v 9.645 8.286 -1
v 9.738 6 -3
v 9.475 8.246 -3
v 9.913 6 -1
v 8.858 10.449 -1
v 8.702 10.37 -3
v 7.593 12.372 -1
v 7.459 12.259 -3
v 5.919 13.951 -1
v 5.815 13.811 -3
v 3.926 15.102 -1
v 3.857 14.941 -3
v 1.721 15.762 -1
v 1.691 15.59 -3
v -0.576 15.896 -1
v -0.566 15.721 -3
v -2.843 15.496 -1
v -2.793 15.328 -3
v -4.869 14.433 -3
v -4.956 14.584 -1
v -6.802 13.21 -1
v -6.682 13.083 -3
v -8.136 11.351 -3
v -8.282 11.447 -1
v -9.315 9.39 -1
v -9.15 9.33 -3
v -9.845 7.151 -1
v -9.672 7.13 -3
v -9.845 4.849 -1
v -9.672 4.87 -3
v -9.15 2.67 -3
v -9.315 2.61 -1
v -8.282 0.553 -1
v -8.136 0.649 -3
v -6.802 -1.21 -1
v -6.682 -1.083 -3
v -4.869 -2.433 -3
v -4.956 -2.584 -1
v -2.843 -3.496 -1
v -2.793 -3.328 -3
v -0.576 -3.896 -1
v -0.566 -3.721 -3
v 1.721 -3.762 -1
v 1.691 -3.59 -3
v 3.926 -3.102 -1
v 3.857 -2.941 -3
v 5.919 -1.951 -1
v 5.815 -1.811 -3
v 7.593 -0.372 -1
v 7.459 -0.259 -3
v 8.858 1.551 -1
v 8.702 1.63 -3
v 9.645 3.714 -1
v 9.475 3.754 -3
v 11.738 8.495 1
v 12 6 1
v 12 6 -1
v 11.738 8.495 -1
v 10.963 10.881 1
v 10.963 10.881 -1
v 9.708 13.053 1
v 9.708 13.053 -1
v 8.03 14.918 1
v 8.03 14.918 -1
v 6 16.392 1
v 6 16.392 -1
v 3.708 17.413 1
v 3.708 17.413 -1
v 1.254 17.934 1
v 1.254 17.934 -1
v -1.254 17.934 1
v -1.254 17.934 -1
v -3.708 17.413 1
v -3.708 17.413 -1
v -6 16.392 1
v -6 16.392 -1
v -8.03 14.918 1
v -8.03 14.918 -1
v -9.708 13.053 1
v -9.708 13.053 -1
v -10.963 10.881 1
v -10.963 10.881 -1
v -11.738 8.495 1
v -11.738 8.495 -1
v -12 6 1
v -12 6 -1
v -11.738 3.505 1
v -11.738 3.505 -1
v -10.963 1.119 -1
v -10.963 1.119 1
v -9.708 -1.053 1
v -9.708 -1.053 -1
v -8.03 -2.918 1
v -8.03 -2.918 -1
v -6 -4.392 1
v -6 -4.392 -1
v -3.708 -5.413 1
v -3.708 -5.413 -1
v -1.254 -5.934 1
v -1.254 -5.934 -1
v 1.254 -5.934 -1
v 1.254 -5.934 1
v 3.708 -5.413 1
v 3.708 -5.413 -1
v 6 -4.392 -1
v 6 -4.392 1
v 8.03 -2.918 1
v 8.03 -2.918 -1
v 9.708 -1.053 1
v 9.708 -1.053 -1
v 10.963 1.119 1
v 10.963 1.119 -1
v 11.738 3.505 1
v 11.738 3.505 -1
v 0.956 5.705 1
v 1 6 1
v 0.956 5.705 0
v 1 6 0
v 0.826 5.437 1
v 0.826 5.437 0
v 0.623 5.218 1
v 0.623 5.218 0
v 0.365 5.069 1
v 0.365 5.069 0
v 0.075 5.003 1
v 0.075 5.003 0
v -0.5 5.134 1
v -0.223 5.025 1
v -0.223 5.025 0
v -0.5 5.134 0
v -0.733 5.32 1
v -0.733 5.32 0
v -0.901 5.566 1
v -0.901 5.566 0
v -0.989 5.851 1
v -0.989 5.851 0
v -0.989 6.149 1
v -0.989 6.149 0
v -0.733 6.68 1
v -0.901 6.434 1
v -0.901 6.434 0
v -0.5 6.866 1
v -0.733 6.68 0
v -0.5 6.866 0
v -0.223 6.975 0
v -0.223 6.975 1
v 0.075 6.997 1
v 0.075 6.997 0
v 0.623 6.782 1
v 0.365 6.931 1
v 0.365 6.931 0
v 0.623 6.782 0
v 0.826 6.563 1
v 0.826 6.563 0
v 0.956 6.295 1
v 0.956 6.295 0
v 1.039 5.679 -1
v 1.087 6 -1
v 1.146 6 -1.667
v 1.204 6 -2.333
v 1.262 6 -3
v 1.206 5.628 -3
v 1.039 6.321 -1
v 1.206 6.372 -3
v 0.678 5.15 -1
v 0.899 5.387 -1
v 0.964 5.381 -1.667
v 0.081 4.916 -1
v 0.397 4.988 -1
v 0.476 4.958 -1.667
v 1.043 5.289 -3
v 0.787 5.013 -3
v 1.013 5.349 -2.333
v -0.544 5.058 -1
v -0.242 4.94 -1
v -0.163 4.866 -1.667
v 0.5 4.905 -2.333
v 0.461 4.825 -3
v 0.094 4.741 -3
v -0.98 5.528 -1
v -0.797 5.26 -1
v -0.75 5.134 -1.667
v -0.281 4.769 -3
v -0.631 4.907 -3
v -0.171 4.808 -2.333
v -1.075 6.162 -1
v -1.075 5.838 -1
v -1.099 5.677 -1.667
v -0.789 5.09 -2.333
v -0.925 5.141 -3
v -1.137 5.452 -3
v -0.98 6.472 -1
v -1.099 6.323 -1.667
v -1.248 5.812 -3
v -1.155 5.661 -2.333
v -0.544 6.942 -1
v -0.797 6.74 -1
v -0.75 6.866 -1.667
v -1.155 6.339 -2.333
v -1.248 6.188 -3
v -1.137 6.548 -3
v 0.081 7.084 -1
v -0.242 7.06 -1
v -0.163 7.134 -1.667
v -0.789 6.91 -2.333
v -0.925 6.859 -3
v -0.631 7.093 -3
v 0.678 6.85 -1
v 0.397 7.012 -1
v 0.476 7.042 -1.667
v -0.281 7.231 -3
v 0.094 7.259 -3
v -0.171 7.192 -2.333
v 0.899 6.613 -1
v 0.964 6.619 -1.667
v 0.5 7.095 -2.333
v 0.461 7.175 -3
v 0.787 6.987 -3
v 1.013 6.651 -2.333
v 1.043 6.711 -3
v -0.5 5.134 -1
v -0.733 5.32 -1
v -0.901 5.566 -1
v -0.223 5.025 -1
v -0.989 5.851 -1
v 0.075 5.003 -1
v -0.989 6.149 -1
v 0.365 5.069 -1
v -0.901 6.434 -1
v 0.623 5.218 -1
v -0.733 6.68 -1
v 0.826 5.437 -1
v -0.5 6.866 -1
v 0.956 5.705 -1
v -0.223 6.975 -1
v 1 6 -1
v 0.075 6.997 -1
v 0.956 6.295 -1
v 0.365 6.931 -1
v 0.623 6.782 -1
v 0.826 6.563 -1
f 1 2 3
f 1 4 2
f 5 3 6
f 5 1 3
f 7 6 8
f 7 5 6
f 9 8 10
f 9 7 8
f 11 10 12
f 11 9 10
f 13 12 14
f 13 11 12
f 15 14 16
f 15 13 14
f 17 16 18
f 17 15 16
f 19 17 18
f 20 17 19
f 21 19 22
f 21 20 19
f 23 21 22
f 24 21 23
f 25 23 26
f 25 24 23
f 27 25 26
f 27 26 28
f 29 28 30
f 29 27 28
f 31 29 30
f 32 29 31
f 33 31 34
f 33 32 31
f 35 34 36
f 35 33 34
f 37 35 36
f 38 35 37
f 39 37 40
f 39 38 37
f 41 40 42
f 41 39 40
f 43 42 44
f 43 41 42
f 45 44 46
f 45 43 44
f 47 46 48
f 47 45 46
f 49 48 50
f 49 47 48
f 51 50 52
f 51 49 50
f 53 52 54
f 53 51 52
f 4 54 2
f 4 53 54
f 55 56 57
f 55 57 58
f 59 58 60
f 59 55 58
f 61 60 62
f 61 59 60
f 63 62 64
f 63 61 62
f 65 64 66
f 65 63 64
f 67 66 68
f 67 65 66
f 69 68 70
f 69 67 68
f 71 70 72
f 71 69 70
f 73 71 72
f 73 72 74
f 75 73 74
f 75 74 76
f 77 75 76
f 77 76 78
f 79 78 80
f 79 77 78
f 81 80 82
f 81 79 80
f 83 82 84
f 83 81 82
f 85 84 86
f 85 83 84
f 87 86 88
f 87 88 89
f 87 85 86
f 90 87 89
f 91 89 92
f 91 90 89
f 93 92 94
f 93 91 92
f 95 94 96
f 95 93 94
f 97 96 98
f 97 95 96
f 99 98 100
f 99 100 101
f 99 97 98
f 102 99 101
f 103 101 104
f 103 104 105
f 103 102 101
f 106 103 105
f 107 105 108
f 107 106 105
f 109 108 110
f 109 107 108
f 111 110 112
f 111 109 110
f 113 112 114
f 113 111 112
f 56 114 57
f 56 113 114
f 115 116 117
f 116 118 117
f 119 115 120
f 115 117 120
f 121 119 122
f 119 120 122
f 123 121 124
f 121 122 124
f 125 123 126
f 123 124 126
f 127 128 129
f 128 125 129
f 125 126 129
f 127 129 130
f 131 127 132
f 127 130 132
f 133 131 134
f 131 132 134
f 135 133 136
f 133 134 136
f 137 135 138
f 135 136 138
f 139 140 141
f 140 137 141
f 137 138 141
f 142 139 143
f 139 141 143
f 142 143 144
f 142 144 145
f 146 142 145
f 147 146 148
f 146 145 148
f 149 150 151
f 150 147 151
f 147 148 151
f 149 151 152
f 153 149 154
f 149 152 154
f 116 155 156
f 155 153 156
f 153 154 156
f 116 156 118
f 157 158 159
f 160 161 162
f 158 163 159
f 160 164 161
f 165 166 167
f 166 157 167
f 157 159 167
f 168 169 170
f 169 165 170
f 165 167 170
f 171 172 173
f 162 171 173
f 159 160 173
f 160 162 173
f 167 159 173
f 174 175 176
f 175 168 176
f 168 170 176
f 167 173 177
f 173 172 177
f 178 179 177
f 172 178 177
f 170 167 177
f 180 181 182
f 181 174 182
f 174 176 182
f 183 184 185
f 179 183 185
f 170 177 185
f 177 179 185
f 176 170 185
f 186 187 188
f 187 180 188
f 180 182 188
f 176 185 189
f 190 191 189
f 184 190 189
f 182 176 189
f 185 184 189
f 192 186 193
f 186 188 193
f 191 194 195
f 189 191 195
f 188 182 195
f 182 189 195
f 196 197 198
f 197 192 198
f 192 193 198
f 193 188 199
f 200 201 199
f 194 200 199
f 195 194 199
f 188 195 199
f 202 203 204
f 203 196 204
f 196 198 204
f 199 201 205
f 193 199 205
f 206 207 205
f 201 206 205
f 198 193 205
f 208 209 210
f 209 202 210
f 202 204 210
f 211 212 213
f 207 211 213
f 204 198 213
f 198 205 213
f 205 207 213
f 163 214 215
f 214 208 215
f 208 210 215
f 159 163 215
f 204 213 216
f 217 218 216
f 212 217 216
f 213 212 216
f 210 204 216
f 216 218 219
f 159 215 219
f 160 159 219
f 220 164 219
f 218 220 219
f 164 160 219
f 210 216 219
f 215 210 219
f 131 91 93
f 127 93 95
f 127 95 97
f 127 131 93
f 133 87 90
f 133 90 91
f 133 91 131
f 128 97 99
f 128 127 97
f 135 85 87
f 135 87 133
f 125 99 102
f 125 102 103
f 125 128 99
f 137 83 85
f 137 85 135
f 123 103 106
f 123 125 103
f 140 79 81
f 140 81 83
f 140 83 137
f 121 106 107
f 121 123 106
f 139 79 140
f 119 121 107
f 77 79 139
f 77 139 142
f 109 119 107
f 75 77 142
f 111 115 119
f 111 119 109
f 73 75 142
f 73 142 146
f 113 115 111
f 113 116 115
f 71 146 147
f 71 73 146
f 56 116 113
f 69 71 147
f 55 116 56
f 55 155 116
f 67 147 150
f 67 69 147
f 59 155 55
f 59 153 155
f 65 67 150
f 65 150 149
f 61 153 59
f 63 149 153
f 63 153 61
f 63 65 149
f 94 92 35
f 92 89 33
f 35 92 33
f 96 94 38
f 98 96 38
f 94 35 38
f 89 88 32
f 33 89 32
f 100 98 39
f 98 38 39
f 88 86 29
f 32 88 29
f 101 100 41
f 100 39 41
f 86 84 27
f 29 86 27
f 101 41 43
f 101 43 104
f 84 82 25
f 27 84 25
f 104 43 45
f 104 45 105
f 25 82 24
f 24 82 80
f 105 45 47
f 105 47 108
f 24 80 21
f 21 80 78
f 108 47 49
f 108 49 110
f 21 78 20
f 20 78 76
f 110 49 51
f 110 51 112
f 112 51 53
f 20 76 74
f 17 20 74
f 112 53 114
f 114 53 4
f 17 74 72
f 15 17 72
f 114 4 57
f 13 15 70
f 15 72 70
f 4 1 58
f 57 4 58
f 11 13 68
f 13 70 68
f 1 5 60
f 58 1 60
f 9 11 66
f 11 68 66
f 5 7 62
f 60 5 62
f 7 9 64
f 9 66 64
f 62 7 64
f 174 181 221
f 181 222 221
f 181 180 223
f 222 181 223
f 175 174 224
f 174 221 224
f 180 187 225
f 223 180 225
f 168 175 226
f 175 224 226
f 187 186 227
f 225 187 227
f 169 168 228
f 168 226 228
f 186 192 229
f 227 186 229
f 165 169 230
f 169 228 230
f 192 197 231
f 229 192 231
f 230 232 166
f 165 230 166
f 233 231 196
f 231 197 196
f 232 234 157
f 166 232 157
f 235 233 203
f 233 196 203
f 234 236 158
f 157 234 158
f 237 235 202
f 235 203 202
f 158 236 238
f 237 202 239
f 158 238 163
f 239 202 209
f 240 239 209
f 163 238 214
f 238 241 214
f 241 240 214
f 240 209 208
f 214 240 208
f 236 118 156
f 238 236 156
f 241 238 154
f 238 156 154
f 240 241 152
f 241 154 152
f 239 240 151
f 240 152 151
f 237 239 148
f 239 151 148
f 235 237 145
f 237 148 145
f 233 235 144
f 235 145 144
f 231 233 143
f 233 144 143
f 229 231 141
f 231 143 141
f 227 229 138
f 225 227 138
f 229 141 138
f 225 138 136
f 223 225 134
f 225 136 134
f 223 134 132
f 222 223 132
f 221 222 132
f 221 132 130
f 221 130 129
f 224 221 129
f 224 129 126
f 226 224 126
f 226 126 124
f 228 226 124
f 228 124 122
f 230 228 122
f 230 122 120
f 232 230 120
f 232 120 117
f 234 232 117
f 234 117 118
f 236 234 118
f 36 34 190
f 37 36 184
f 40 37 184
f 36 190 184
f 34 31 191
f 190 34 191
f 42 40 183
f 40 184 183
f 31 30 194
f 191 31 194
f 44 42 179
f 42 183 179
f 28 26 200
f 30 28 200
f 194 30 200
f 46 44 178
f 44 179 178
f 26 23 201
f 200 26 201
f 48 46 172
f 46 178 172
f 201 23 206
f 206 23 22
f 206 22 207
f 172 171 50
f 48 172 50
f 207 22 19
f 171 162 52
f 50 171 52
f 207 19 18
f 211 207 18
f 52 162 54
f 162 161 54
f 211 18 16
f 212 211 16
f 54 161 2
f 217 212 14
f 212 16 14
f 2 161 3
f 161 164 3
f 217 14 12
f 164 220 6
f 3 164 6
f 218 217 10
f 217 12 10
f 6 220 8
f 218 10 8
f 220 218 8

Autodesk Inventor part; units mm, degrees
ref_plane "YZ Plane" through (0, 0, 0) normal (1, 0, 0) x (0, 1, 0)
ref_plane "XZ Plane" through (0, 0, 0) normal (0, 1, 0) x (-1, 0, 0)
ref_plane "XY Plane" through (0, 0, 0) normal (0, 0, 1) x (1, 0, 0)
ref_plane "Arbeitsebene1" through (0, 0, 0) normal (0, 0, 1) x (1, 0, 0)
sketch "Skizze1" plane through (0, 0, 0) normal (0, 0, 1) x (1, 0, 0)
  line L0 (-6, -30.9) -> (-6, -18.4)
  line L1 (-6, -30.9) -> (-19.3, -30.9)
  line L2 (-19.3, -30.9) -> (-19.3, -33.9)
  line L3 (10.7, -33.9) -> (-19.3, -33.9)
  line L4 (10.7, -30.9) -> (10.7, -33.9)
  line L5 (10.7, -30.9) -> (6, -30.9)
  line L6 (6, -18.4) -> (6, -30.9)
  line L7 (16.5, -18.4) -> (6, -18.4)
  line L8 (16.5, -15.118081) -> (16.5, -18.4)
  line L9 (21.118081, -10.5) -> (16.5, -15.118081)
  line L10 (24.4, -10.5) -> (21.118081, -10.5)
  line L11 (24.4, 22.5) -> (24.4, -10.5)
  line L12 (21.118081, 22.5) -> (24.4, 22.5)
  line L13 (16.5, 27.118081) -> (21.118081, 22.5)
  line L14 (16.5, 30.4) -> (16.5, 27.118081)
  line L15 (-16.5, 30.4) -> (-2.249898, 30.4)
  line L16 (-16.5, 27.118081) -> (-16.5, 30.4)
  line L17 (-21.118081, 22.5) -> (-16.5, 27.118081)
  line L18 (-24.4, 22.5) -> (-21.118081, 22.5)
  line L19 (-24.4, -10.5) -> (-24.4, 22.5)
  line L20 (-21.118081, -10.5) -> (-24.4, -10.5)
  line L21 (-16.5, -15.118081) -> (-21.118081, -10.5)
  line L22 (-16.5, -18.4) -> (-16.5, -15.118081)
  line L23 (-6, -18.4) -> (-16.5, -18.4)
  spline S0 degree 2 poles (21.854355, -9.517776) (21.708528, -9.626528) (21.308123, -9.745166) (21.028828, -9.745166) knots 0 0 0 1 2 2 2
  spline S1 degree 2 poles (21.028828, -9.745166) (20.776721, -9.745166) (20.324412, -9.633942) (20.176113, -9.559793) knots 0 0 0 1 2 2 2
  line L24 (20.176113, -9.559793) -> (20.176113, -8.954242)
  line L25 (20.176113, -8.954242) -> (20.235433, -8.954242)
  spline S2 degree 2 poles (20.235433, -8.954242) (20.287337, -8.993788) (20.418334, -9.087711) (20.534501, -9.139615) knots 0 0 0 1 2 2 2
  spline S3 degree 2 poles (20.534501, -9.139615) (20.635838, -9.186576) (20.885473, -9.25331) (21.033771, -9.25331) knots 0 0 0 1 2 2 2
  spline S4 degree 2 poles (21.033771, -9.25331) (21.184541, -9.25331) (21.416875, -9.159388) (21.416875, -9.058051) knots 0 0 0 1 2 2 2
  spline S5 degree 2 poles (21.416875, -9.058051) (21.416875, -8.978959) (21.310595, -8.894923) (21.157353, -8.86032) knots 0 0 0 1 2 2 2
  spline S6 degree 2 poles (21.157353, -8.86032) (21.075789, -8.838075) (20.826154, -8.791114) (20.72976, -8.761455) knots 0 0 0 1 2 2 2
  spline S7 degree 2 poles (20.72976, -8.761455) (20.45788, -8.677419) (20.186, -8.348691) (20.186, -8.079283) knots 0 0 0 1 2 2 2
  spline S8 degree 2 poles (20.186, -8.079283) (20.186, -7.926041) (20.326883, -7.654161) (20.465295, -7.547881) knots 0 0 0 1 2 2 2
  spline S9 degree 2 poles (20.465295, -7.547881) (20.601235, -7.444072) (21.004112, -7.32049) (21.25869, -7.32049) knots 0 0 0 1 2 2 2
  spline S10 degree 2 poles (21.25869, -7.32049) (21.500911, -7.32049) (21.906259, -7.416884) (22.044671, -7.483618) knots 0 0 0 1 2 2 2
  line L26 (22.044671, -7.483618) -> (22.044671, -8.066925)
  line L27 (22.044671, -8.066925) -> (21.987823, -8.066925)
  spline S11 degree 2 poles (21.987823, -8.066925) (21.950749, -8.037265) (21.790092, -7.940871) (21.715943, -7.906268) knots 0 0 0 1 2 2 2
  spline S12 degree 2 poles (21.715943, -7.906268) (21.624493, -7.866722) (21.402045, -7.812346) (21.285878, -7.812346) knots 0 0 0 1 2 2 2
  spline S13 degree 2 poles (21.285878, -7.812346) (21.130165, -7.812346) (20.915133, -7.918626) (20.915133, -8.005134) knots 0 0 0 1 2 2 2
  spline S14 degree 2 poles (20.915133, -8.005134) (20.915133, -8.084226) (21.021413, -8.173205) (21.199371, -8.217694) knots 0 0 0 1 2 2 2
  spline S15 degree 2 poles (21.199371, -8.217694) (21.290822, -8.239939) (21.53057, -8.281957) (21.641794, -8.319032) knots 0 0 0 1 2 2 2
  spline S16 degree 2 poles (21.641794, -8.319032) (21.888958, -8.398124) (22.146008, -8.707079) (22.146008, -8.964129) knots 0 0 0 1 2 2 2
  spline S17 degree 2 poles (22.146008, -8.964129) (22.146008, -9.124785) (21.995238, -9.41891) (21.854355, -9.517776) knots 0 0 0 1 2 2 2
  spline S18 degree 2 poles (16.997588, -9.685847) (16.893779, -9.715506) (16.710878, -9.745166) (16.560108, -9.745166) knots 0 0 0 1 2 2 2
  spline S19 degree 2 poles (16.560108, -9.745166) (16.27587, -9.745166) (15.803787, -9.601811) (15.628301, -9.453513) knots 0 0 0 1 2 2 2
  spline S20 degree 2 poles (15.628301, -9.453513) (15.457758, -9.302743) (15.264971, -8.850434) (15.264971, -8.543951) knots 0 0 0 1 2 2 2
  spline S21 degree 2 poles (15.264971, -8.543951) (15.264971, -8.212751) (15.472588, -7.750555) (15.653018, -7.602257) knots 0 0 0 1 2 2 2
  spline S22 degree 2 poles (15.653018, -7.602257) (15.823561, -7.458902) (16.288228, -7.32049) (16.540335, -7.32049) knots 0 0 0 1 2 2 2
  spline S23 degree 2 poles (16.540335, -7.32049) (16.730651, -7.32049) (17.111283, -7.409469) (17.304071, -7.505863) knots 0 0 0 1 2 2 2
  line L28 (17.304071, -7.505863) -> (17.304071, -8.118829)
  line L29 (17.304071, -8.118829) -> (17.212621, -8.118829)
  spline S24 degree 2 poles (17.212621, -8.118829) (17.168131, -8.076811) (17.044549, -7.977946) (16.9704, -7.938399) knots 0 0 0 1 2 2 2
  spline S25 degree 2 poles (16.9704, -7.938399) (16.891308, -7.89391) (16.696048, -7.834591) (16.574938, -7.834591) knots 0 0 0 1 2 2 2
  spline S26 degree 2 poles (16.574938, -7.834591) (16.300587, -7.834591) (15.999047, -8.217694) (15.999047, -8.543951) knots 0 0 0 1 2 2 2
  spline S27 degree 2 poles (15.999047, -8.543951) (15.999047, -8.88998) (16.32036, -9.231066) (16.587296, -9.231066) knots 0 0 0 1 2 2 2
  spline S28 degree 2 poles (16.587296, -9.231066) (16.723236, -9.231066) (16.925911, -9.169275) (17.00006, -9.124785) knots 0 0 0 1 2 2 2
  spline S29 degree 2 poles (17.00006, -9.124785) (17.071737, -9.082767) (17.175546, -8.988845) (17.212621, -8.951771) knots 0 0 0 1 2 2 2
  line L30 (17.212621, -8.951771) -> (17.304071, -8.951771)
  line L31 (17.304071, -8.951771) -> (17.304071, -9.567208)
  spline S30 degree 2 poles (17.304071, -9.567208) (17.24228, -9.594396) (17.081624, -9.663602) (16.997588, -9.685847) knots 0 0 0 1 2 2 2
  spline S31 degree 2 poles (13.866024, -7.310604) (14.429557, -7.310604) (15.05241, -7.963116) (15.05241, -8.534064) knots 0 0 0 1 2 2 2
  spline S32 degree 2 poles (15.05241, -8.534064) (15.05241, -9.102541) (14.432029, -9.755053) (13.866024, -9.755053) knots 0 0 0 1 2 2 2
  spline S33 degree 2 poles (13.866024, -9.755053) (13.302491, -9.755053) (12.677167, -9.102541) (12.677167, -8.534064) knots 0 0 0 1 2 2 2
  spline S34 degree 2 poles (12.677167, -8.534064) (12.677167, -7.960644) (13.302491, -7.310604) (13.866024, -7.310604) knots 0 0 0 1 2 2 2
  spline S35 degree 2 poles (8.361688, -9.663602) (8.245522, -9.693262) (7.983528, -9.727865) (7.79074, -9.727865) knots 0 0 0 1 2 2 2
  spline S36 degree 2 poles (7.79074, -9.727865) (7.353261, -9.727865) (6.952855, -9.367006) (6.952855, -8.956714) knots 0 0 0 1 2 2 2
  line L32 (6.952855, -8.956714) -> (6.952855, -7.881552)
  line L33 (6.952855, -7.881552) -> (6.678504, -7.881552)
  line L34 (6.678504, -7.881552) -> (6.678504, -7.382281)
  line L35 (6.678504, -7.382281) -> (6.952855, -7.382281)
  line L36 (6.952855, -7.382281) -> (6.952855, -6.724826)
  line L37 (6.952855, -6.724826) -> (7.66963, -6.724826)
  line L38 (7.66963, -6.724826) -> (7.66963, -7.382281)
  line L39 (7.66963, -7.382281) -> (8.361688, -7.382281)
  line L40 (8.361688, -7.382281) -> (8.361688, -7.881552)
  line L41 (8.361688, -7.881552) -> (7.66963, -7.881552)
  line L42 (7.66963, -7.881552) -> (7.66963, -8.699664)
  spline S37 degree 2 poles (7.66963, -8.699664) (7.66963, -8.820774) (7.674573, -9.001203) (7.704233, -9.072881) knots 0 0 0 1 2 2 2
  spline S38 degree 2 poles (7.704233, -9.072881) (7.733893, -9.144558) (7.879719, -9.228594) (8.018131, -9.228594) knots 0 0 0 1 2 2 2
  spline S39 degree 2 poles (8.018131, -9.228594) (8.07745, -9.228594) (8.262823, -9.179161) (8.299898, -9.159388) knots 0 0 0 1 2 2 2
  line L43 (8.299898, -9.159388) -> (8.361688, -9.159388)
  line L44 (8.361688, -9.159388) -> (8.361688, -9.663602)
  spline S40 degree 2 poles (-8.240297, -8.729323) (-8.240297, -9.184105) (-8.9546, -9.737751) (-9.562623, -9.737751) knots 0 0 0 1 2 2 2
  spline S41 degree 2 poles (-9.562623, -9.737751) (-9.913596, -9.737751) (-10.442526, -9.601811) (-10.669917, -9.502946) knots 0 0 0 1 2 2 2
  line L45 (-10.669917, -9.502946) -> (-10.669917, -8.776284)
  line L46 (-10.669917, -8.776284) -> (-10.600711, -8.776284)
  spline S42 degree 2 poles (-10.600711, -8.776284) (-10.370848, -8.971544) (-9.819673, -9.181633) (-9.560152, -9.181633) knots 0 0 0 1 2 2 2
  spline S43 degree 2 poles (-9.560152, -9.181633) (-9.493417, -9.181633) (-9.278385, -9.151973) (-9.214122, -9.122314) knots 0 0 0 1 2 2 2
  spline S44 degree 2 poles (-9.214122, -9.122314) (-9.13503, -9.087711) (-9.023806, -8.961657) (-9.023806, -8.86032) knots 0 0 0 1 2 2 2
  spline S45 degree 2 poles (-9.023806, -8.86032) (-9.023806, -8.744153) (-9.204236, -8.600798) (-9.327818, -8.568667) knots 0 0 0 1 2 2 2
  spline S46 degree 2 poles (-9.327818, -8.568667) (-9.483531, -8.526649) (-9.836975, -8.454972) (-9.992688, -8.400596) knots 0 0 0 1 2 2 2
  spline S47 degree 2 poles (-9.992688, -8.400596) (-10.346132, -8.277014) (-10.652615, -7.854364) (-10.652615, -7.537994) knots 0 0 0 1 2 2 2
  spline S48 degree 2 poles (-10.652615, -7.537994) (-10.652615, -7.110401) (-9.928425, -6.578999) (-9.384665, -6.578999) knots 0 0 0 1 2 2 2
  spline S49 degree 2 poles (-9.384665, -6.578999) (-9.112785, -6.578999) (-8.573968, -6.690223) (-8.361408, -6.784145) knots 0 0 0 1 2 2 2
  line L47 (-8.361408, -6.784145) -> (-8.361408, -7.481147)
  line L48 (-8.361408, -7.481147) -> (-8.428142, -7.481147)
  spline S50 degree 2 poles (-8.428142, -7.481147) (-8.598685, -7.33532) (-9.088069, -7.135117) (-9.345119, -7.135117) knots 0 0 0 1 2 2 2
  spline S51 degree 2 poles (-9.345119, -7.135117) (-9.446456, -7.135117) (-9.604641, -7.164777) (-9.69362, -7.204323) knots 0 0 0 1 2 2 2
  spline S52 degree 2 poles (-9.69362, -7.204323) (-9.765297, -7.236455) (-9.869106, -7.36498) (-9.869106, -7.444072) knots 0 0 0 1 2 2 2
  spline S53 degree 2 poles (-9.869106, -7.444072) (-9.869106, -7.562711) (-9.703506, -7.698651) (-9.466229, -7.753027) knots 0 0 0 1 2 2 2
  spline S54 degree 2 poles (-9.466229, -7.753027) (-9.312988, -7.78763) (-9.02875, -7.854364) (-8.865622, -7.911211) knots 0 0 0 1 2 2 2
  spline S55 degree 2 poles (-8.865622, -7.911211) (-8.549252, -8.027378) (-8.240297, -8.412954) (-8.240297, -8.729323) knots 0 0 0 1 2 2 2
  line L49 (-14.466351, -8.049623) -> (-13.334341, -9.683375)
  line L50 (-13.334341, -9.683375) -> (-14.261205, -9.683375)
  line L51 (-14.261205, -9.683375) -> (-15.089204, -8.445085)
  line L52 (-15.089204, -8.445085) -> (-15.239973, -8.652703)
  line L53 (-15.239973, -8.652703) -> (-15.239973, -9.683375)
  line L54 (-15.239973, -9.683375) -> (-16.006181, -9.683375)
  line L55 (-16.006181, -9.683375) -> (-16.006181, -6.633375)
  line L56 (-16.006181, -6.633375) -> (-15.239973, -6.633375)
  line L57 (-15.239973, -6.633375) -> (-15.239973, -7.995247)
  line L58 (-15.239973, -7.995247) -> (-14.261205, -6.633375)
  line L59 (-14.261205, -6.633375) -> (-13.378831, -6.633375)
  line L60 (-13.378831, -6.633375) -> (-14.466351, -8.049623)
  line L61 (-11.023361, -9.683375) -> (-13.084706, -9.683375)
  line L62 (-13.084706, -9.683375) -> (-13.084706, -6.633375)
  line L63 (-13.084706, -6.633375) -> (-11.023361, -6.633375)
  line L64 (-11.023361, -6.633375) -> (-11.023361, -7.21421)
  line L65 (-11.023361, -7.21421) -> (-12.323442, -7.21421)
  line L66 (-12.323442, -7.21421) -> (-12.323442, -7.750555)
  line L67 (-12.323442, -7.750555) -> (-11.124698, -7.750555)
  line L68 (-11.124698, -7.750555) -> (-11.124698, -8.33139)
  line L69 (-11.124698, -8.33139) -> (-12.323442, -8.33139)
  line L70 (-12.323442, -8.33139) -> (-12.323442, -9.102541)
  line L71 (-12.323442, -9.102541) -> (-11.023361, -9.102541)
  line L72 (-11.023361, -9.102541) -> (-11.023361, -9.683375)
  line L73 (-5.575873, -8.42284) -> (-5.575873, -8.971544)
  line L74 (-5.575873, -8.971544) -> (-5.988636, -8.971544)
  line L75 (-5.988636, -8.971544) -> (-5.988636, -9.69079)
  line L76 (-5.988636, -9.69079) -> (-6.727655, -9.69079)
  line L77 (-6.727655, -9.69079) -> (-6.727655, -8.971544)
  line L78 (-6.727655, -8.971544) -> (-8.072226, -8.971544)
  line L79 (-8.072226, -8.971544) -> (-8.072226, -8.403067)
  line L80 (-8.072226, -8.403067) -> (-6.752372, -6.633375)
  line L81 (-6.752372, -6.633375) -> (-5.988636, -6.633375)
  line L82 (-5.988636, -6.633375) -> (-5.988636, -8.42284)
  line L83 (-5.988636, -8.42284) -> (-5.575873, -8.42284)
  spline S56 degree 2 poles (-3.245119, -6.984348) (-3.106707, -7.18455) (-2.980654, -7.775271) (-2.980654, -8.158375) knots 0 0 0 1 2 2 2
  spline S57 degree 2 poles (-2.980654, -8.158375) (-2.980654, -8.553837) (-3.106707, -9.14703) (-3.247591, -9.347233) knots 0 0 0 1 2 2 2
  spline S58 degree 2 poles (-3.247591, -9.347233) (-3.386002, -9.544964) (-3.833369, -9.747638) (-4.154681, -9.747638) knots 0 0 0 1 2 2 2
  spline S59 degree 2 poles (-4.154681, -9.747638) (-4.478466, -9.747638) (-4.92336, -9.544964) (-5.064244, -9.342289) knots 0 0 0 1 2 2 2
  spline S60 degree 2 poles (-5.064244, -9.342289) (-5.205127, -9.142087) (-5.331181, -8.553837) (-5.331181, -8.158375) knots 0 0 0 1 2 2 2
  spline S61 degree 2 poles (-5.331181, -8.158375) (-5.331181, -7.753027) (-5.205127, -7.179607) (-5.061772, -6.971989) knots 0 0 0 1 2 2 2
  spline S62 degree 2 poles (-5.061772, -6.971989) (-4.918417, -6.769315) (-4.466108, -6.571584) (-4.154681, -6.571584) knots 0 0 0 1 2 2 2
  spline S63 degree 2 poles (-4.154681, -6.571584) (-3.825954, -6.571584) (-3.386002, -6.779202) (-3.245119, -6.984348) knots 0 0 0 1 2 2 2
  spline S64 degree 2 poles (-0.573279, -6.984348) (-0.434868, -7.18455) (-0.308814, -7.775271) (-0.308814, -8.158375) knots 0 0 0 1 2 2 2
  spline S65 degree 2 poles (-0.308814, -8.158375) (-0.308814, -8.553837) (-0.434868, -9.14703) (-0.575751, -9.347233) knots 0 0 0 1 2 2 2
  spline S66 degree 2 poles (-0.575751, -9.347233) (-0.714163, -9.544964) (-1.161529, -9.747638) (-1.482842, -9.747638) knots 0 0 0 1 2 2 2
  spline S67 degree 2 poles (-1.482842, -9.747638) (-1.806626, -9.747638) (-2.251521, -9.544964) (-2.392404, -9.342289) knots 0 0 0 1 2 2 2
  spline S68 degree 2 poles (-2.392404, -9.342289) (-2.533287, -9.142087) (-2.659341, -8.553837) (-2.659341, -8.158375) knots 0 0 0 1 2 2 2
  spline S69 degree 2 poles (-2.659341, -8.158375) (-2.659341, -7.753027) (-2.533287, -7.179607) (-2.389933, -6.971989) knots 0 0 0 1 2 2 2
  spline S70 degree 2 poles (-2.389933, -6.971989) (-2.246578, -6.769315) (-1.794268, -6.571584) (-1.482842, -6.571584) knots 0 0 0 1 2 2 2
  spline S71 degree 2 poles (-1.482842, -6.571584) (-1.154114, -6.571584) (-0.714163, -6.779202) (-0.573279, -6.984348) knots 0 0 0 1 2 2 2
  line L84 (1.834095, -9.683375) -> (1.067888, -9.683375)
  line L85 (1.067888, -9.683375) -> (2.09856, -6.633375)
  line L86 (2.09856, -6.633375) -> (2.933974, -6.633375)
  line L87 (2.933974, -6.633375) -> (3.964646, -9.683375)
  line L88 (3.964646, -9.683375) -> (3.176194, -9.683375)
  line L89 (3.176194, -9.683375) -> (2.985878, -9.060523)
  line L90 (2.985878, -9.060523) -> (2.026883, -9.060523)
  line L91 (2.026883, -9.060523) -> (1.834095, -9.683375)
  line L92 (6.362134, -7.382281) -> (6.362134, -9.683375)
  line L93 (6.362134, -9.683375) -> (5.645359, -9.683375)
  line L94 (5.645359, -9.683375) -> (5.645359, -9.428797)
  spline S72 degree 2 poles (5.645359, -9.428797) (5.459987, -9.58451) (5.14856, -9.747638) (4.933528, -9.747638) knots 0 0 0 1 2 2 2
  spline S73 degree 2 poles (4.933528, -9.747638) (4.592442, -9.747638) (4.209338, -9.315101) (4.209338, -8.880093) knots 0 0 0 1 2 2 2
  line L95 (4.209338, -8.880093) -> (4.209338, -7.382281)
  line L96 (4.209338, -7.382281) -> (4.931056, -7.382281)
  line L97 (4.931056, -7.382281) -> (4.931056, -8.524177)
  spline S74 degree 2 poles (4.931056, -8.524177) (4.931056, -8.702135) (4.948358, -8.929526) (4.982961, -9.006147) knots 0 0 0 1 2 2 2
  spline S75 degree 2 poles (4.982961, -9.006147) (5.017564, -9.077824) (5.153504, -9.151973) (5.277085, -9.151973) knots 0 0 0 1 2 2 2
  spline S76 degree 2 poles (5.277085, -9.151973) (5.351235, -9.151973) (5.558852, -9.077824) (5.645359, -9.013562) knots 0 0 0 1 2 2 2
  line L98 (5.645359, -9.013562) -> (5.645359, -7.382281)
  line L99 (5.645359, -7.382281) -> (6.362134, -7.382281)
  spline S77 degree 2 poles (9.674128, -7.310604) (10.237661, -7.310604) (10.860513, -7.963116) (10.860513, -8.534064) knots 0 0 0 1 2 2 2
  spline S78 degree 2 poles (10.860513, -8.534064) (10.860513, -9.102541) (10.240133, -9.755053) (9.674128, -9.755053) knots 0 0 0 1 2 2 2
  spline S79 degree 2 poles (9.674128, -9.755053) (9.110594, -9.755053) (8.48527, -9.102541) (8.48527, -8.534064) knots 0 0 0 1 2 2 2
  spline S80 degree 2 poles (8.48527, -8.534064) (8.48527, -7.960644) (9.110594, -7.310604) (9.674128, -7.310604) knots 0 0 0 1 2 2 2
  line L100 (12.71177, -6.51968) -> (12.71177, -7.038724)
  line L101 (12.71177, -7.038724) -> (12.657394, -7.038724)
  spline S81 degree 2 poles (12.657394, -7.038724) (12.615376, -7.026365) (12.43989, -6.986819) (12.363269, -6.986819) knots 0 0 0 1 2 2 2
  spline S82 degree 2 poles (12.363269, -6.986819) (12.145765, -6.986819) (11.98758, -7.145004) (11.98758, -7.36498) knots 0 0 0 1 2 2 2
  line L102 (11.98758, -7.36498) -> (11.98758, -7.382281)
  line L103 (11.98758, -7.382281) -> (12.558528, -7.382281)
  line L104 (12.558528, -7.382281) -> (12.558528, -7.881552)
  line L105 (12.558528, -7.881552) -> (12.012296, -7.881552)
  line L106 (12.012296, -7.881552) -> (12.012296, -9.683375)
  line L107 (12.012296, -9.683375) -> (11.295522, -9.683375)
  line L108 (11.295522, -9.683375) -> (11.295522, -7.881552)
  line L109 (11.295522, -7.881552) -> (11.008812, -7.881552)
  line L110 (11.008812, -7.881552) -> (11.008812, -7.382281)
  line L111 (11.008812, -7.382281) -> (11.295522, -7.382281)
  line L112 (11.295522, -7.382281) -> (11.295522, -7.318019)
  spline S83 degree 2 poles (11.295522, -7.318019) (11.295522, -6.89784) (11.737945, -6.477662) (12.187783, -6.477662) knots 0 0 0 1 2 2 2
  spline S84 degree 2 poles (12.187783, -6.477662) (12.343496, -6.477662) (12.612904, -6.499907) (12.71177, -6.51968) knots 0 0 0 1 2 2 2
  line L113 (19.780651, -7.382281) -> (19.780651, -9.683375)
  line L114 (19.780651, -9.683375) -> (19.063877, -9.683375)
  line L115 (19.063877, -9.683375) -> (19.063877, -9.428797)
  spline S85 degree 2 poles (19.063877, -9.428797) (18.878504, -9.58451) (18.567078, -9.747638) (18.352045, -9.747638) knots 0 0 0 1 2 2 2
  spline S86 degree 2 poles (18.352045, -9.747638) (18.010959, -9.747638) (17.627856, -9.315101) (17.627856, -8.880093) knots 0 0 0 1 2 2 2
  line L116 (17.627856, -8.880093) -> (17.627856, -7.382281)
  line L117 (17.627856, -7.382281) -> (18.349574, -7.382281)
  line L118 (18.349574, -7.382281) -> (18.349574, -8.524177)
  spline S87 degree 2 poles (18.349574, -8.524177) (18.349574, -8.702135) (18.366875, -8.929526) (18.401478, -9.006147) knots 0 0 0 1 2 2 2
  spline S88 degree 2 poles (18.401478, -9.006147) (18.436081, -9.077824) (18.572021, -9.151973) (18.695603, -9.151973) knots 0 0 0 1 2 2 2
  spline S89 degree 2 poles (18.695603, -9.151973) (18.769752, -9.151973) (18.977369, -9.077824) (19.063877, -9.013562) knots 0 0 0 1 2 2 2
  line L119 (19.063877, -9.013562) -> (19.063877, -7.382281)
  line L120 (19.063877, -7.382281) -> (19.780651, -7.382281)
  arc A0 (2.5, 17.25833) -> (-11, 9.464102) centre (-2, 9.464102) ccw
  line L121 (8.5, 13.794229) -> (2.5, 17.25833)
  arc A1 (8.5, -1.794229) -> (8.5, 13.794229) centre (4, 6) ccw
  line L122 (2.5, -5.25833) -> (8.5, -1.794229)
  arc A2 (-11, 2.535898) -> (2.5, -5.25833) centre (-2, 2.535898) ccw
  line L123 (-11, 9.464102) -> (-11, 2.535898)
  line L124 (2, 16.392305) -> (8, 12.928203)
  line L125 (-10, 2.535898) -> (-10, 9.464102)
  line L126 (12, -3.206349) -> (-12, -3.206349)
  line L127 (8, -0.928203) -> (2, -4.392305)
  circle A3 centre (0, 6) radius 10
  circle A4 centre (0, 6) radius 1
  arc A5 (-2.249898, 30.4) -> (2.249898, 30.4) centre (0, 28.054695) ccw
  line L128 (2.249898, 30.4) -> (16.5, 30.4)
  point P0 (0, 0)
  dimension "d0" = 2
sketch "Skizze1 outline for Extrusion1" plane through (0, 0, 0) normal (0, 0, 1) x (1, 0, 0)
  circle A0 centre (0, 6) radius 10
  circle A1 centre (0, 6) radius 1
extrude "Extrusion1" add sketch "Skizze1 outline for Extrusion1" against normal blind 3 draft -5
ref_plane "Arbeitsebene2" through (0, 6, -1) normal (0, 0, -1) x (-1, 0, 0)
sketch "Skizze4" plane through (0, 6, -1) normal (0, 0, -1) x (-1, 0, 0)
  circle A0 centre (0, 0) radius 10
  circle A1 centre (0, 0) radius 9.737534
  point P0 (0, -6)
sketch "Skizze5" plane through (0, 6, 0) normal (0, 0, 1) x (1, 0, 0)
  circle A0 centre (0, 0) radius 1 projected
  circle A1 centre (0, 0) radius 10 projected
  circle A2 centre (0, 0) radius 1 projected
  circle A3 centre (0, 0) radius 12
  point P0 (0, -6)
  dimension "d9" = 24
extrude "Extrusion4" add sketch "Skizze5" along normal mid plane 2 contours A1 | A3
properties part number "20_Cube_Insert_Autofocus_KES400a_mirrorinsert_alignmenttube"
